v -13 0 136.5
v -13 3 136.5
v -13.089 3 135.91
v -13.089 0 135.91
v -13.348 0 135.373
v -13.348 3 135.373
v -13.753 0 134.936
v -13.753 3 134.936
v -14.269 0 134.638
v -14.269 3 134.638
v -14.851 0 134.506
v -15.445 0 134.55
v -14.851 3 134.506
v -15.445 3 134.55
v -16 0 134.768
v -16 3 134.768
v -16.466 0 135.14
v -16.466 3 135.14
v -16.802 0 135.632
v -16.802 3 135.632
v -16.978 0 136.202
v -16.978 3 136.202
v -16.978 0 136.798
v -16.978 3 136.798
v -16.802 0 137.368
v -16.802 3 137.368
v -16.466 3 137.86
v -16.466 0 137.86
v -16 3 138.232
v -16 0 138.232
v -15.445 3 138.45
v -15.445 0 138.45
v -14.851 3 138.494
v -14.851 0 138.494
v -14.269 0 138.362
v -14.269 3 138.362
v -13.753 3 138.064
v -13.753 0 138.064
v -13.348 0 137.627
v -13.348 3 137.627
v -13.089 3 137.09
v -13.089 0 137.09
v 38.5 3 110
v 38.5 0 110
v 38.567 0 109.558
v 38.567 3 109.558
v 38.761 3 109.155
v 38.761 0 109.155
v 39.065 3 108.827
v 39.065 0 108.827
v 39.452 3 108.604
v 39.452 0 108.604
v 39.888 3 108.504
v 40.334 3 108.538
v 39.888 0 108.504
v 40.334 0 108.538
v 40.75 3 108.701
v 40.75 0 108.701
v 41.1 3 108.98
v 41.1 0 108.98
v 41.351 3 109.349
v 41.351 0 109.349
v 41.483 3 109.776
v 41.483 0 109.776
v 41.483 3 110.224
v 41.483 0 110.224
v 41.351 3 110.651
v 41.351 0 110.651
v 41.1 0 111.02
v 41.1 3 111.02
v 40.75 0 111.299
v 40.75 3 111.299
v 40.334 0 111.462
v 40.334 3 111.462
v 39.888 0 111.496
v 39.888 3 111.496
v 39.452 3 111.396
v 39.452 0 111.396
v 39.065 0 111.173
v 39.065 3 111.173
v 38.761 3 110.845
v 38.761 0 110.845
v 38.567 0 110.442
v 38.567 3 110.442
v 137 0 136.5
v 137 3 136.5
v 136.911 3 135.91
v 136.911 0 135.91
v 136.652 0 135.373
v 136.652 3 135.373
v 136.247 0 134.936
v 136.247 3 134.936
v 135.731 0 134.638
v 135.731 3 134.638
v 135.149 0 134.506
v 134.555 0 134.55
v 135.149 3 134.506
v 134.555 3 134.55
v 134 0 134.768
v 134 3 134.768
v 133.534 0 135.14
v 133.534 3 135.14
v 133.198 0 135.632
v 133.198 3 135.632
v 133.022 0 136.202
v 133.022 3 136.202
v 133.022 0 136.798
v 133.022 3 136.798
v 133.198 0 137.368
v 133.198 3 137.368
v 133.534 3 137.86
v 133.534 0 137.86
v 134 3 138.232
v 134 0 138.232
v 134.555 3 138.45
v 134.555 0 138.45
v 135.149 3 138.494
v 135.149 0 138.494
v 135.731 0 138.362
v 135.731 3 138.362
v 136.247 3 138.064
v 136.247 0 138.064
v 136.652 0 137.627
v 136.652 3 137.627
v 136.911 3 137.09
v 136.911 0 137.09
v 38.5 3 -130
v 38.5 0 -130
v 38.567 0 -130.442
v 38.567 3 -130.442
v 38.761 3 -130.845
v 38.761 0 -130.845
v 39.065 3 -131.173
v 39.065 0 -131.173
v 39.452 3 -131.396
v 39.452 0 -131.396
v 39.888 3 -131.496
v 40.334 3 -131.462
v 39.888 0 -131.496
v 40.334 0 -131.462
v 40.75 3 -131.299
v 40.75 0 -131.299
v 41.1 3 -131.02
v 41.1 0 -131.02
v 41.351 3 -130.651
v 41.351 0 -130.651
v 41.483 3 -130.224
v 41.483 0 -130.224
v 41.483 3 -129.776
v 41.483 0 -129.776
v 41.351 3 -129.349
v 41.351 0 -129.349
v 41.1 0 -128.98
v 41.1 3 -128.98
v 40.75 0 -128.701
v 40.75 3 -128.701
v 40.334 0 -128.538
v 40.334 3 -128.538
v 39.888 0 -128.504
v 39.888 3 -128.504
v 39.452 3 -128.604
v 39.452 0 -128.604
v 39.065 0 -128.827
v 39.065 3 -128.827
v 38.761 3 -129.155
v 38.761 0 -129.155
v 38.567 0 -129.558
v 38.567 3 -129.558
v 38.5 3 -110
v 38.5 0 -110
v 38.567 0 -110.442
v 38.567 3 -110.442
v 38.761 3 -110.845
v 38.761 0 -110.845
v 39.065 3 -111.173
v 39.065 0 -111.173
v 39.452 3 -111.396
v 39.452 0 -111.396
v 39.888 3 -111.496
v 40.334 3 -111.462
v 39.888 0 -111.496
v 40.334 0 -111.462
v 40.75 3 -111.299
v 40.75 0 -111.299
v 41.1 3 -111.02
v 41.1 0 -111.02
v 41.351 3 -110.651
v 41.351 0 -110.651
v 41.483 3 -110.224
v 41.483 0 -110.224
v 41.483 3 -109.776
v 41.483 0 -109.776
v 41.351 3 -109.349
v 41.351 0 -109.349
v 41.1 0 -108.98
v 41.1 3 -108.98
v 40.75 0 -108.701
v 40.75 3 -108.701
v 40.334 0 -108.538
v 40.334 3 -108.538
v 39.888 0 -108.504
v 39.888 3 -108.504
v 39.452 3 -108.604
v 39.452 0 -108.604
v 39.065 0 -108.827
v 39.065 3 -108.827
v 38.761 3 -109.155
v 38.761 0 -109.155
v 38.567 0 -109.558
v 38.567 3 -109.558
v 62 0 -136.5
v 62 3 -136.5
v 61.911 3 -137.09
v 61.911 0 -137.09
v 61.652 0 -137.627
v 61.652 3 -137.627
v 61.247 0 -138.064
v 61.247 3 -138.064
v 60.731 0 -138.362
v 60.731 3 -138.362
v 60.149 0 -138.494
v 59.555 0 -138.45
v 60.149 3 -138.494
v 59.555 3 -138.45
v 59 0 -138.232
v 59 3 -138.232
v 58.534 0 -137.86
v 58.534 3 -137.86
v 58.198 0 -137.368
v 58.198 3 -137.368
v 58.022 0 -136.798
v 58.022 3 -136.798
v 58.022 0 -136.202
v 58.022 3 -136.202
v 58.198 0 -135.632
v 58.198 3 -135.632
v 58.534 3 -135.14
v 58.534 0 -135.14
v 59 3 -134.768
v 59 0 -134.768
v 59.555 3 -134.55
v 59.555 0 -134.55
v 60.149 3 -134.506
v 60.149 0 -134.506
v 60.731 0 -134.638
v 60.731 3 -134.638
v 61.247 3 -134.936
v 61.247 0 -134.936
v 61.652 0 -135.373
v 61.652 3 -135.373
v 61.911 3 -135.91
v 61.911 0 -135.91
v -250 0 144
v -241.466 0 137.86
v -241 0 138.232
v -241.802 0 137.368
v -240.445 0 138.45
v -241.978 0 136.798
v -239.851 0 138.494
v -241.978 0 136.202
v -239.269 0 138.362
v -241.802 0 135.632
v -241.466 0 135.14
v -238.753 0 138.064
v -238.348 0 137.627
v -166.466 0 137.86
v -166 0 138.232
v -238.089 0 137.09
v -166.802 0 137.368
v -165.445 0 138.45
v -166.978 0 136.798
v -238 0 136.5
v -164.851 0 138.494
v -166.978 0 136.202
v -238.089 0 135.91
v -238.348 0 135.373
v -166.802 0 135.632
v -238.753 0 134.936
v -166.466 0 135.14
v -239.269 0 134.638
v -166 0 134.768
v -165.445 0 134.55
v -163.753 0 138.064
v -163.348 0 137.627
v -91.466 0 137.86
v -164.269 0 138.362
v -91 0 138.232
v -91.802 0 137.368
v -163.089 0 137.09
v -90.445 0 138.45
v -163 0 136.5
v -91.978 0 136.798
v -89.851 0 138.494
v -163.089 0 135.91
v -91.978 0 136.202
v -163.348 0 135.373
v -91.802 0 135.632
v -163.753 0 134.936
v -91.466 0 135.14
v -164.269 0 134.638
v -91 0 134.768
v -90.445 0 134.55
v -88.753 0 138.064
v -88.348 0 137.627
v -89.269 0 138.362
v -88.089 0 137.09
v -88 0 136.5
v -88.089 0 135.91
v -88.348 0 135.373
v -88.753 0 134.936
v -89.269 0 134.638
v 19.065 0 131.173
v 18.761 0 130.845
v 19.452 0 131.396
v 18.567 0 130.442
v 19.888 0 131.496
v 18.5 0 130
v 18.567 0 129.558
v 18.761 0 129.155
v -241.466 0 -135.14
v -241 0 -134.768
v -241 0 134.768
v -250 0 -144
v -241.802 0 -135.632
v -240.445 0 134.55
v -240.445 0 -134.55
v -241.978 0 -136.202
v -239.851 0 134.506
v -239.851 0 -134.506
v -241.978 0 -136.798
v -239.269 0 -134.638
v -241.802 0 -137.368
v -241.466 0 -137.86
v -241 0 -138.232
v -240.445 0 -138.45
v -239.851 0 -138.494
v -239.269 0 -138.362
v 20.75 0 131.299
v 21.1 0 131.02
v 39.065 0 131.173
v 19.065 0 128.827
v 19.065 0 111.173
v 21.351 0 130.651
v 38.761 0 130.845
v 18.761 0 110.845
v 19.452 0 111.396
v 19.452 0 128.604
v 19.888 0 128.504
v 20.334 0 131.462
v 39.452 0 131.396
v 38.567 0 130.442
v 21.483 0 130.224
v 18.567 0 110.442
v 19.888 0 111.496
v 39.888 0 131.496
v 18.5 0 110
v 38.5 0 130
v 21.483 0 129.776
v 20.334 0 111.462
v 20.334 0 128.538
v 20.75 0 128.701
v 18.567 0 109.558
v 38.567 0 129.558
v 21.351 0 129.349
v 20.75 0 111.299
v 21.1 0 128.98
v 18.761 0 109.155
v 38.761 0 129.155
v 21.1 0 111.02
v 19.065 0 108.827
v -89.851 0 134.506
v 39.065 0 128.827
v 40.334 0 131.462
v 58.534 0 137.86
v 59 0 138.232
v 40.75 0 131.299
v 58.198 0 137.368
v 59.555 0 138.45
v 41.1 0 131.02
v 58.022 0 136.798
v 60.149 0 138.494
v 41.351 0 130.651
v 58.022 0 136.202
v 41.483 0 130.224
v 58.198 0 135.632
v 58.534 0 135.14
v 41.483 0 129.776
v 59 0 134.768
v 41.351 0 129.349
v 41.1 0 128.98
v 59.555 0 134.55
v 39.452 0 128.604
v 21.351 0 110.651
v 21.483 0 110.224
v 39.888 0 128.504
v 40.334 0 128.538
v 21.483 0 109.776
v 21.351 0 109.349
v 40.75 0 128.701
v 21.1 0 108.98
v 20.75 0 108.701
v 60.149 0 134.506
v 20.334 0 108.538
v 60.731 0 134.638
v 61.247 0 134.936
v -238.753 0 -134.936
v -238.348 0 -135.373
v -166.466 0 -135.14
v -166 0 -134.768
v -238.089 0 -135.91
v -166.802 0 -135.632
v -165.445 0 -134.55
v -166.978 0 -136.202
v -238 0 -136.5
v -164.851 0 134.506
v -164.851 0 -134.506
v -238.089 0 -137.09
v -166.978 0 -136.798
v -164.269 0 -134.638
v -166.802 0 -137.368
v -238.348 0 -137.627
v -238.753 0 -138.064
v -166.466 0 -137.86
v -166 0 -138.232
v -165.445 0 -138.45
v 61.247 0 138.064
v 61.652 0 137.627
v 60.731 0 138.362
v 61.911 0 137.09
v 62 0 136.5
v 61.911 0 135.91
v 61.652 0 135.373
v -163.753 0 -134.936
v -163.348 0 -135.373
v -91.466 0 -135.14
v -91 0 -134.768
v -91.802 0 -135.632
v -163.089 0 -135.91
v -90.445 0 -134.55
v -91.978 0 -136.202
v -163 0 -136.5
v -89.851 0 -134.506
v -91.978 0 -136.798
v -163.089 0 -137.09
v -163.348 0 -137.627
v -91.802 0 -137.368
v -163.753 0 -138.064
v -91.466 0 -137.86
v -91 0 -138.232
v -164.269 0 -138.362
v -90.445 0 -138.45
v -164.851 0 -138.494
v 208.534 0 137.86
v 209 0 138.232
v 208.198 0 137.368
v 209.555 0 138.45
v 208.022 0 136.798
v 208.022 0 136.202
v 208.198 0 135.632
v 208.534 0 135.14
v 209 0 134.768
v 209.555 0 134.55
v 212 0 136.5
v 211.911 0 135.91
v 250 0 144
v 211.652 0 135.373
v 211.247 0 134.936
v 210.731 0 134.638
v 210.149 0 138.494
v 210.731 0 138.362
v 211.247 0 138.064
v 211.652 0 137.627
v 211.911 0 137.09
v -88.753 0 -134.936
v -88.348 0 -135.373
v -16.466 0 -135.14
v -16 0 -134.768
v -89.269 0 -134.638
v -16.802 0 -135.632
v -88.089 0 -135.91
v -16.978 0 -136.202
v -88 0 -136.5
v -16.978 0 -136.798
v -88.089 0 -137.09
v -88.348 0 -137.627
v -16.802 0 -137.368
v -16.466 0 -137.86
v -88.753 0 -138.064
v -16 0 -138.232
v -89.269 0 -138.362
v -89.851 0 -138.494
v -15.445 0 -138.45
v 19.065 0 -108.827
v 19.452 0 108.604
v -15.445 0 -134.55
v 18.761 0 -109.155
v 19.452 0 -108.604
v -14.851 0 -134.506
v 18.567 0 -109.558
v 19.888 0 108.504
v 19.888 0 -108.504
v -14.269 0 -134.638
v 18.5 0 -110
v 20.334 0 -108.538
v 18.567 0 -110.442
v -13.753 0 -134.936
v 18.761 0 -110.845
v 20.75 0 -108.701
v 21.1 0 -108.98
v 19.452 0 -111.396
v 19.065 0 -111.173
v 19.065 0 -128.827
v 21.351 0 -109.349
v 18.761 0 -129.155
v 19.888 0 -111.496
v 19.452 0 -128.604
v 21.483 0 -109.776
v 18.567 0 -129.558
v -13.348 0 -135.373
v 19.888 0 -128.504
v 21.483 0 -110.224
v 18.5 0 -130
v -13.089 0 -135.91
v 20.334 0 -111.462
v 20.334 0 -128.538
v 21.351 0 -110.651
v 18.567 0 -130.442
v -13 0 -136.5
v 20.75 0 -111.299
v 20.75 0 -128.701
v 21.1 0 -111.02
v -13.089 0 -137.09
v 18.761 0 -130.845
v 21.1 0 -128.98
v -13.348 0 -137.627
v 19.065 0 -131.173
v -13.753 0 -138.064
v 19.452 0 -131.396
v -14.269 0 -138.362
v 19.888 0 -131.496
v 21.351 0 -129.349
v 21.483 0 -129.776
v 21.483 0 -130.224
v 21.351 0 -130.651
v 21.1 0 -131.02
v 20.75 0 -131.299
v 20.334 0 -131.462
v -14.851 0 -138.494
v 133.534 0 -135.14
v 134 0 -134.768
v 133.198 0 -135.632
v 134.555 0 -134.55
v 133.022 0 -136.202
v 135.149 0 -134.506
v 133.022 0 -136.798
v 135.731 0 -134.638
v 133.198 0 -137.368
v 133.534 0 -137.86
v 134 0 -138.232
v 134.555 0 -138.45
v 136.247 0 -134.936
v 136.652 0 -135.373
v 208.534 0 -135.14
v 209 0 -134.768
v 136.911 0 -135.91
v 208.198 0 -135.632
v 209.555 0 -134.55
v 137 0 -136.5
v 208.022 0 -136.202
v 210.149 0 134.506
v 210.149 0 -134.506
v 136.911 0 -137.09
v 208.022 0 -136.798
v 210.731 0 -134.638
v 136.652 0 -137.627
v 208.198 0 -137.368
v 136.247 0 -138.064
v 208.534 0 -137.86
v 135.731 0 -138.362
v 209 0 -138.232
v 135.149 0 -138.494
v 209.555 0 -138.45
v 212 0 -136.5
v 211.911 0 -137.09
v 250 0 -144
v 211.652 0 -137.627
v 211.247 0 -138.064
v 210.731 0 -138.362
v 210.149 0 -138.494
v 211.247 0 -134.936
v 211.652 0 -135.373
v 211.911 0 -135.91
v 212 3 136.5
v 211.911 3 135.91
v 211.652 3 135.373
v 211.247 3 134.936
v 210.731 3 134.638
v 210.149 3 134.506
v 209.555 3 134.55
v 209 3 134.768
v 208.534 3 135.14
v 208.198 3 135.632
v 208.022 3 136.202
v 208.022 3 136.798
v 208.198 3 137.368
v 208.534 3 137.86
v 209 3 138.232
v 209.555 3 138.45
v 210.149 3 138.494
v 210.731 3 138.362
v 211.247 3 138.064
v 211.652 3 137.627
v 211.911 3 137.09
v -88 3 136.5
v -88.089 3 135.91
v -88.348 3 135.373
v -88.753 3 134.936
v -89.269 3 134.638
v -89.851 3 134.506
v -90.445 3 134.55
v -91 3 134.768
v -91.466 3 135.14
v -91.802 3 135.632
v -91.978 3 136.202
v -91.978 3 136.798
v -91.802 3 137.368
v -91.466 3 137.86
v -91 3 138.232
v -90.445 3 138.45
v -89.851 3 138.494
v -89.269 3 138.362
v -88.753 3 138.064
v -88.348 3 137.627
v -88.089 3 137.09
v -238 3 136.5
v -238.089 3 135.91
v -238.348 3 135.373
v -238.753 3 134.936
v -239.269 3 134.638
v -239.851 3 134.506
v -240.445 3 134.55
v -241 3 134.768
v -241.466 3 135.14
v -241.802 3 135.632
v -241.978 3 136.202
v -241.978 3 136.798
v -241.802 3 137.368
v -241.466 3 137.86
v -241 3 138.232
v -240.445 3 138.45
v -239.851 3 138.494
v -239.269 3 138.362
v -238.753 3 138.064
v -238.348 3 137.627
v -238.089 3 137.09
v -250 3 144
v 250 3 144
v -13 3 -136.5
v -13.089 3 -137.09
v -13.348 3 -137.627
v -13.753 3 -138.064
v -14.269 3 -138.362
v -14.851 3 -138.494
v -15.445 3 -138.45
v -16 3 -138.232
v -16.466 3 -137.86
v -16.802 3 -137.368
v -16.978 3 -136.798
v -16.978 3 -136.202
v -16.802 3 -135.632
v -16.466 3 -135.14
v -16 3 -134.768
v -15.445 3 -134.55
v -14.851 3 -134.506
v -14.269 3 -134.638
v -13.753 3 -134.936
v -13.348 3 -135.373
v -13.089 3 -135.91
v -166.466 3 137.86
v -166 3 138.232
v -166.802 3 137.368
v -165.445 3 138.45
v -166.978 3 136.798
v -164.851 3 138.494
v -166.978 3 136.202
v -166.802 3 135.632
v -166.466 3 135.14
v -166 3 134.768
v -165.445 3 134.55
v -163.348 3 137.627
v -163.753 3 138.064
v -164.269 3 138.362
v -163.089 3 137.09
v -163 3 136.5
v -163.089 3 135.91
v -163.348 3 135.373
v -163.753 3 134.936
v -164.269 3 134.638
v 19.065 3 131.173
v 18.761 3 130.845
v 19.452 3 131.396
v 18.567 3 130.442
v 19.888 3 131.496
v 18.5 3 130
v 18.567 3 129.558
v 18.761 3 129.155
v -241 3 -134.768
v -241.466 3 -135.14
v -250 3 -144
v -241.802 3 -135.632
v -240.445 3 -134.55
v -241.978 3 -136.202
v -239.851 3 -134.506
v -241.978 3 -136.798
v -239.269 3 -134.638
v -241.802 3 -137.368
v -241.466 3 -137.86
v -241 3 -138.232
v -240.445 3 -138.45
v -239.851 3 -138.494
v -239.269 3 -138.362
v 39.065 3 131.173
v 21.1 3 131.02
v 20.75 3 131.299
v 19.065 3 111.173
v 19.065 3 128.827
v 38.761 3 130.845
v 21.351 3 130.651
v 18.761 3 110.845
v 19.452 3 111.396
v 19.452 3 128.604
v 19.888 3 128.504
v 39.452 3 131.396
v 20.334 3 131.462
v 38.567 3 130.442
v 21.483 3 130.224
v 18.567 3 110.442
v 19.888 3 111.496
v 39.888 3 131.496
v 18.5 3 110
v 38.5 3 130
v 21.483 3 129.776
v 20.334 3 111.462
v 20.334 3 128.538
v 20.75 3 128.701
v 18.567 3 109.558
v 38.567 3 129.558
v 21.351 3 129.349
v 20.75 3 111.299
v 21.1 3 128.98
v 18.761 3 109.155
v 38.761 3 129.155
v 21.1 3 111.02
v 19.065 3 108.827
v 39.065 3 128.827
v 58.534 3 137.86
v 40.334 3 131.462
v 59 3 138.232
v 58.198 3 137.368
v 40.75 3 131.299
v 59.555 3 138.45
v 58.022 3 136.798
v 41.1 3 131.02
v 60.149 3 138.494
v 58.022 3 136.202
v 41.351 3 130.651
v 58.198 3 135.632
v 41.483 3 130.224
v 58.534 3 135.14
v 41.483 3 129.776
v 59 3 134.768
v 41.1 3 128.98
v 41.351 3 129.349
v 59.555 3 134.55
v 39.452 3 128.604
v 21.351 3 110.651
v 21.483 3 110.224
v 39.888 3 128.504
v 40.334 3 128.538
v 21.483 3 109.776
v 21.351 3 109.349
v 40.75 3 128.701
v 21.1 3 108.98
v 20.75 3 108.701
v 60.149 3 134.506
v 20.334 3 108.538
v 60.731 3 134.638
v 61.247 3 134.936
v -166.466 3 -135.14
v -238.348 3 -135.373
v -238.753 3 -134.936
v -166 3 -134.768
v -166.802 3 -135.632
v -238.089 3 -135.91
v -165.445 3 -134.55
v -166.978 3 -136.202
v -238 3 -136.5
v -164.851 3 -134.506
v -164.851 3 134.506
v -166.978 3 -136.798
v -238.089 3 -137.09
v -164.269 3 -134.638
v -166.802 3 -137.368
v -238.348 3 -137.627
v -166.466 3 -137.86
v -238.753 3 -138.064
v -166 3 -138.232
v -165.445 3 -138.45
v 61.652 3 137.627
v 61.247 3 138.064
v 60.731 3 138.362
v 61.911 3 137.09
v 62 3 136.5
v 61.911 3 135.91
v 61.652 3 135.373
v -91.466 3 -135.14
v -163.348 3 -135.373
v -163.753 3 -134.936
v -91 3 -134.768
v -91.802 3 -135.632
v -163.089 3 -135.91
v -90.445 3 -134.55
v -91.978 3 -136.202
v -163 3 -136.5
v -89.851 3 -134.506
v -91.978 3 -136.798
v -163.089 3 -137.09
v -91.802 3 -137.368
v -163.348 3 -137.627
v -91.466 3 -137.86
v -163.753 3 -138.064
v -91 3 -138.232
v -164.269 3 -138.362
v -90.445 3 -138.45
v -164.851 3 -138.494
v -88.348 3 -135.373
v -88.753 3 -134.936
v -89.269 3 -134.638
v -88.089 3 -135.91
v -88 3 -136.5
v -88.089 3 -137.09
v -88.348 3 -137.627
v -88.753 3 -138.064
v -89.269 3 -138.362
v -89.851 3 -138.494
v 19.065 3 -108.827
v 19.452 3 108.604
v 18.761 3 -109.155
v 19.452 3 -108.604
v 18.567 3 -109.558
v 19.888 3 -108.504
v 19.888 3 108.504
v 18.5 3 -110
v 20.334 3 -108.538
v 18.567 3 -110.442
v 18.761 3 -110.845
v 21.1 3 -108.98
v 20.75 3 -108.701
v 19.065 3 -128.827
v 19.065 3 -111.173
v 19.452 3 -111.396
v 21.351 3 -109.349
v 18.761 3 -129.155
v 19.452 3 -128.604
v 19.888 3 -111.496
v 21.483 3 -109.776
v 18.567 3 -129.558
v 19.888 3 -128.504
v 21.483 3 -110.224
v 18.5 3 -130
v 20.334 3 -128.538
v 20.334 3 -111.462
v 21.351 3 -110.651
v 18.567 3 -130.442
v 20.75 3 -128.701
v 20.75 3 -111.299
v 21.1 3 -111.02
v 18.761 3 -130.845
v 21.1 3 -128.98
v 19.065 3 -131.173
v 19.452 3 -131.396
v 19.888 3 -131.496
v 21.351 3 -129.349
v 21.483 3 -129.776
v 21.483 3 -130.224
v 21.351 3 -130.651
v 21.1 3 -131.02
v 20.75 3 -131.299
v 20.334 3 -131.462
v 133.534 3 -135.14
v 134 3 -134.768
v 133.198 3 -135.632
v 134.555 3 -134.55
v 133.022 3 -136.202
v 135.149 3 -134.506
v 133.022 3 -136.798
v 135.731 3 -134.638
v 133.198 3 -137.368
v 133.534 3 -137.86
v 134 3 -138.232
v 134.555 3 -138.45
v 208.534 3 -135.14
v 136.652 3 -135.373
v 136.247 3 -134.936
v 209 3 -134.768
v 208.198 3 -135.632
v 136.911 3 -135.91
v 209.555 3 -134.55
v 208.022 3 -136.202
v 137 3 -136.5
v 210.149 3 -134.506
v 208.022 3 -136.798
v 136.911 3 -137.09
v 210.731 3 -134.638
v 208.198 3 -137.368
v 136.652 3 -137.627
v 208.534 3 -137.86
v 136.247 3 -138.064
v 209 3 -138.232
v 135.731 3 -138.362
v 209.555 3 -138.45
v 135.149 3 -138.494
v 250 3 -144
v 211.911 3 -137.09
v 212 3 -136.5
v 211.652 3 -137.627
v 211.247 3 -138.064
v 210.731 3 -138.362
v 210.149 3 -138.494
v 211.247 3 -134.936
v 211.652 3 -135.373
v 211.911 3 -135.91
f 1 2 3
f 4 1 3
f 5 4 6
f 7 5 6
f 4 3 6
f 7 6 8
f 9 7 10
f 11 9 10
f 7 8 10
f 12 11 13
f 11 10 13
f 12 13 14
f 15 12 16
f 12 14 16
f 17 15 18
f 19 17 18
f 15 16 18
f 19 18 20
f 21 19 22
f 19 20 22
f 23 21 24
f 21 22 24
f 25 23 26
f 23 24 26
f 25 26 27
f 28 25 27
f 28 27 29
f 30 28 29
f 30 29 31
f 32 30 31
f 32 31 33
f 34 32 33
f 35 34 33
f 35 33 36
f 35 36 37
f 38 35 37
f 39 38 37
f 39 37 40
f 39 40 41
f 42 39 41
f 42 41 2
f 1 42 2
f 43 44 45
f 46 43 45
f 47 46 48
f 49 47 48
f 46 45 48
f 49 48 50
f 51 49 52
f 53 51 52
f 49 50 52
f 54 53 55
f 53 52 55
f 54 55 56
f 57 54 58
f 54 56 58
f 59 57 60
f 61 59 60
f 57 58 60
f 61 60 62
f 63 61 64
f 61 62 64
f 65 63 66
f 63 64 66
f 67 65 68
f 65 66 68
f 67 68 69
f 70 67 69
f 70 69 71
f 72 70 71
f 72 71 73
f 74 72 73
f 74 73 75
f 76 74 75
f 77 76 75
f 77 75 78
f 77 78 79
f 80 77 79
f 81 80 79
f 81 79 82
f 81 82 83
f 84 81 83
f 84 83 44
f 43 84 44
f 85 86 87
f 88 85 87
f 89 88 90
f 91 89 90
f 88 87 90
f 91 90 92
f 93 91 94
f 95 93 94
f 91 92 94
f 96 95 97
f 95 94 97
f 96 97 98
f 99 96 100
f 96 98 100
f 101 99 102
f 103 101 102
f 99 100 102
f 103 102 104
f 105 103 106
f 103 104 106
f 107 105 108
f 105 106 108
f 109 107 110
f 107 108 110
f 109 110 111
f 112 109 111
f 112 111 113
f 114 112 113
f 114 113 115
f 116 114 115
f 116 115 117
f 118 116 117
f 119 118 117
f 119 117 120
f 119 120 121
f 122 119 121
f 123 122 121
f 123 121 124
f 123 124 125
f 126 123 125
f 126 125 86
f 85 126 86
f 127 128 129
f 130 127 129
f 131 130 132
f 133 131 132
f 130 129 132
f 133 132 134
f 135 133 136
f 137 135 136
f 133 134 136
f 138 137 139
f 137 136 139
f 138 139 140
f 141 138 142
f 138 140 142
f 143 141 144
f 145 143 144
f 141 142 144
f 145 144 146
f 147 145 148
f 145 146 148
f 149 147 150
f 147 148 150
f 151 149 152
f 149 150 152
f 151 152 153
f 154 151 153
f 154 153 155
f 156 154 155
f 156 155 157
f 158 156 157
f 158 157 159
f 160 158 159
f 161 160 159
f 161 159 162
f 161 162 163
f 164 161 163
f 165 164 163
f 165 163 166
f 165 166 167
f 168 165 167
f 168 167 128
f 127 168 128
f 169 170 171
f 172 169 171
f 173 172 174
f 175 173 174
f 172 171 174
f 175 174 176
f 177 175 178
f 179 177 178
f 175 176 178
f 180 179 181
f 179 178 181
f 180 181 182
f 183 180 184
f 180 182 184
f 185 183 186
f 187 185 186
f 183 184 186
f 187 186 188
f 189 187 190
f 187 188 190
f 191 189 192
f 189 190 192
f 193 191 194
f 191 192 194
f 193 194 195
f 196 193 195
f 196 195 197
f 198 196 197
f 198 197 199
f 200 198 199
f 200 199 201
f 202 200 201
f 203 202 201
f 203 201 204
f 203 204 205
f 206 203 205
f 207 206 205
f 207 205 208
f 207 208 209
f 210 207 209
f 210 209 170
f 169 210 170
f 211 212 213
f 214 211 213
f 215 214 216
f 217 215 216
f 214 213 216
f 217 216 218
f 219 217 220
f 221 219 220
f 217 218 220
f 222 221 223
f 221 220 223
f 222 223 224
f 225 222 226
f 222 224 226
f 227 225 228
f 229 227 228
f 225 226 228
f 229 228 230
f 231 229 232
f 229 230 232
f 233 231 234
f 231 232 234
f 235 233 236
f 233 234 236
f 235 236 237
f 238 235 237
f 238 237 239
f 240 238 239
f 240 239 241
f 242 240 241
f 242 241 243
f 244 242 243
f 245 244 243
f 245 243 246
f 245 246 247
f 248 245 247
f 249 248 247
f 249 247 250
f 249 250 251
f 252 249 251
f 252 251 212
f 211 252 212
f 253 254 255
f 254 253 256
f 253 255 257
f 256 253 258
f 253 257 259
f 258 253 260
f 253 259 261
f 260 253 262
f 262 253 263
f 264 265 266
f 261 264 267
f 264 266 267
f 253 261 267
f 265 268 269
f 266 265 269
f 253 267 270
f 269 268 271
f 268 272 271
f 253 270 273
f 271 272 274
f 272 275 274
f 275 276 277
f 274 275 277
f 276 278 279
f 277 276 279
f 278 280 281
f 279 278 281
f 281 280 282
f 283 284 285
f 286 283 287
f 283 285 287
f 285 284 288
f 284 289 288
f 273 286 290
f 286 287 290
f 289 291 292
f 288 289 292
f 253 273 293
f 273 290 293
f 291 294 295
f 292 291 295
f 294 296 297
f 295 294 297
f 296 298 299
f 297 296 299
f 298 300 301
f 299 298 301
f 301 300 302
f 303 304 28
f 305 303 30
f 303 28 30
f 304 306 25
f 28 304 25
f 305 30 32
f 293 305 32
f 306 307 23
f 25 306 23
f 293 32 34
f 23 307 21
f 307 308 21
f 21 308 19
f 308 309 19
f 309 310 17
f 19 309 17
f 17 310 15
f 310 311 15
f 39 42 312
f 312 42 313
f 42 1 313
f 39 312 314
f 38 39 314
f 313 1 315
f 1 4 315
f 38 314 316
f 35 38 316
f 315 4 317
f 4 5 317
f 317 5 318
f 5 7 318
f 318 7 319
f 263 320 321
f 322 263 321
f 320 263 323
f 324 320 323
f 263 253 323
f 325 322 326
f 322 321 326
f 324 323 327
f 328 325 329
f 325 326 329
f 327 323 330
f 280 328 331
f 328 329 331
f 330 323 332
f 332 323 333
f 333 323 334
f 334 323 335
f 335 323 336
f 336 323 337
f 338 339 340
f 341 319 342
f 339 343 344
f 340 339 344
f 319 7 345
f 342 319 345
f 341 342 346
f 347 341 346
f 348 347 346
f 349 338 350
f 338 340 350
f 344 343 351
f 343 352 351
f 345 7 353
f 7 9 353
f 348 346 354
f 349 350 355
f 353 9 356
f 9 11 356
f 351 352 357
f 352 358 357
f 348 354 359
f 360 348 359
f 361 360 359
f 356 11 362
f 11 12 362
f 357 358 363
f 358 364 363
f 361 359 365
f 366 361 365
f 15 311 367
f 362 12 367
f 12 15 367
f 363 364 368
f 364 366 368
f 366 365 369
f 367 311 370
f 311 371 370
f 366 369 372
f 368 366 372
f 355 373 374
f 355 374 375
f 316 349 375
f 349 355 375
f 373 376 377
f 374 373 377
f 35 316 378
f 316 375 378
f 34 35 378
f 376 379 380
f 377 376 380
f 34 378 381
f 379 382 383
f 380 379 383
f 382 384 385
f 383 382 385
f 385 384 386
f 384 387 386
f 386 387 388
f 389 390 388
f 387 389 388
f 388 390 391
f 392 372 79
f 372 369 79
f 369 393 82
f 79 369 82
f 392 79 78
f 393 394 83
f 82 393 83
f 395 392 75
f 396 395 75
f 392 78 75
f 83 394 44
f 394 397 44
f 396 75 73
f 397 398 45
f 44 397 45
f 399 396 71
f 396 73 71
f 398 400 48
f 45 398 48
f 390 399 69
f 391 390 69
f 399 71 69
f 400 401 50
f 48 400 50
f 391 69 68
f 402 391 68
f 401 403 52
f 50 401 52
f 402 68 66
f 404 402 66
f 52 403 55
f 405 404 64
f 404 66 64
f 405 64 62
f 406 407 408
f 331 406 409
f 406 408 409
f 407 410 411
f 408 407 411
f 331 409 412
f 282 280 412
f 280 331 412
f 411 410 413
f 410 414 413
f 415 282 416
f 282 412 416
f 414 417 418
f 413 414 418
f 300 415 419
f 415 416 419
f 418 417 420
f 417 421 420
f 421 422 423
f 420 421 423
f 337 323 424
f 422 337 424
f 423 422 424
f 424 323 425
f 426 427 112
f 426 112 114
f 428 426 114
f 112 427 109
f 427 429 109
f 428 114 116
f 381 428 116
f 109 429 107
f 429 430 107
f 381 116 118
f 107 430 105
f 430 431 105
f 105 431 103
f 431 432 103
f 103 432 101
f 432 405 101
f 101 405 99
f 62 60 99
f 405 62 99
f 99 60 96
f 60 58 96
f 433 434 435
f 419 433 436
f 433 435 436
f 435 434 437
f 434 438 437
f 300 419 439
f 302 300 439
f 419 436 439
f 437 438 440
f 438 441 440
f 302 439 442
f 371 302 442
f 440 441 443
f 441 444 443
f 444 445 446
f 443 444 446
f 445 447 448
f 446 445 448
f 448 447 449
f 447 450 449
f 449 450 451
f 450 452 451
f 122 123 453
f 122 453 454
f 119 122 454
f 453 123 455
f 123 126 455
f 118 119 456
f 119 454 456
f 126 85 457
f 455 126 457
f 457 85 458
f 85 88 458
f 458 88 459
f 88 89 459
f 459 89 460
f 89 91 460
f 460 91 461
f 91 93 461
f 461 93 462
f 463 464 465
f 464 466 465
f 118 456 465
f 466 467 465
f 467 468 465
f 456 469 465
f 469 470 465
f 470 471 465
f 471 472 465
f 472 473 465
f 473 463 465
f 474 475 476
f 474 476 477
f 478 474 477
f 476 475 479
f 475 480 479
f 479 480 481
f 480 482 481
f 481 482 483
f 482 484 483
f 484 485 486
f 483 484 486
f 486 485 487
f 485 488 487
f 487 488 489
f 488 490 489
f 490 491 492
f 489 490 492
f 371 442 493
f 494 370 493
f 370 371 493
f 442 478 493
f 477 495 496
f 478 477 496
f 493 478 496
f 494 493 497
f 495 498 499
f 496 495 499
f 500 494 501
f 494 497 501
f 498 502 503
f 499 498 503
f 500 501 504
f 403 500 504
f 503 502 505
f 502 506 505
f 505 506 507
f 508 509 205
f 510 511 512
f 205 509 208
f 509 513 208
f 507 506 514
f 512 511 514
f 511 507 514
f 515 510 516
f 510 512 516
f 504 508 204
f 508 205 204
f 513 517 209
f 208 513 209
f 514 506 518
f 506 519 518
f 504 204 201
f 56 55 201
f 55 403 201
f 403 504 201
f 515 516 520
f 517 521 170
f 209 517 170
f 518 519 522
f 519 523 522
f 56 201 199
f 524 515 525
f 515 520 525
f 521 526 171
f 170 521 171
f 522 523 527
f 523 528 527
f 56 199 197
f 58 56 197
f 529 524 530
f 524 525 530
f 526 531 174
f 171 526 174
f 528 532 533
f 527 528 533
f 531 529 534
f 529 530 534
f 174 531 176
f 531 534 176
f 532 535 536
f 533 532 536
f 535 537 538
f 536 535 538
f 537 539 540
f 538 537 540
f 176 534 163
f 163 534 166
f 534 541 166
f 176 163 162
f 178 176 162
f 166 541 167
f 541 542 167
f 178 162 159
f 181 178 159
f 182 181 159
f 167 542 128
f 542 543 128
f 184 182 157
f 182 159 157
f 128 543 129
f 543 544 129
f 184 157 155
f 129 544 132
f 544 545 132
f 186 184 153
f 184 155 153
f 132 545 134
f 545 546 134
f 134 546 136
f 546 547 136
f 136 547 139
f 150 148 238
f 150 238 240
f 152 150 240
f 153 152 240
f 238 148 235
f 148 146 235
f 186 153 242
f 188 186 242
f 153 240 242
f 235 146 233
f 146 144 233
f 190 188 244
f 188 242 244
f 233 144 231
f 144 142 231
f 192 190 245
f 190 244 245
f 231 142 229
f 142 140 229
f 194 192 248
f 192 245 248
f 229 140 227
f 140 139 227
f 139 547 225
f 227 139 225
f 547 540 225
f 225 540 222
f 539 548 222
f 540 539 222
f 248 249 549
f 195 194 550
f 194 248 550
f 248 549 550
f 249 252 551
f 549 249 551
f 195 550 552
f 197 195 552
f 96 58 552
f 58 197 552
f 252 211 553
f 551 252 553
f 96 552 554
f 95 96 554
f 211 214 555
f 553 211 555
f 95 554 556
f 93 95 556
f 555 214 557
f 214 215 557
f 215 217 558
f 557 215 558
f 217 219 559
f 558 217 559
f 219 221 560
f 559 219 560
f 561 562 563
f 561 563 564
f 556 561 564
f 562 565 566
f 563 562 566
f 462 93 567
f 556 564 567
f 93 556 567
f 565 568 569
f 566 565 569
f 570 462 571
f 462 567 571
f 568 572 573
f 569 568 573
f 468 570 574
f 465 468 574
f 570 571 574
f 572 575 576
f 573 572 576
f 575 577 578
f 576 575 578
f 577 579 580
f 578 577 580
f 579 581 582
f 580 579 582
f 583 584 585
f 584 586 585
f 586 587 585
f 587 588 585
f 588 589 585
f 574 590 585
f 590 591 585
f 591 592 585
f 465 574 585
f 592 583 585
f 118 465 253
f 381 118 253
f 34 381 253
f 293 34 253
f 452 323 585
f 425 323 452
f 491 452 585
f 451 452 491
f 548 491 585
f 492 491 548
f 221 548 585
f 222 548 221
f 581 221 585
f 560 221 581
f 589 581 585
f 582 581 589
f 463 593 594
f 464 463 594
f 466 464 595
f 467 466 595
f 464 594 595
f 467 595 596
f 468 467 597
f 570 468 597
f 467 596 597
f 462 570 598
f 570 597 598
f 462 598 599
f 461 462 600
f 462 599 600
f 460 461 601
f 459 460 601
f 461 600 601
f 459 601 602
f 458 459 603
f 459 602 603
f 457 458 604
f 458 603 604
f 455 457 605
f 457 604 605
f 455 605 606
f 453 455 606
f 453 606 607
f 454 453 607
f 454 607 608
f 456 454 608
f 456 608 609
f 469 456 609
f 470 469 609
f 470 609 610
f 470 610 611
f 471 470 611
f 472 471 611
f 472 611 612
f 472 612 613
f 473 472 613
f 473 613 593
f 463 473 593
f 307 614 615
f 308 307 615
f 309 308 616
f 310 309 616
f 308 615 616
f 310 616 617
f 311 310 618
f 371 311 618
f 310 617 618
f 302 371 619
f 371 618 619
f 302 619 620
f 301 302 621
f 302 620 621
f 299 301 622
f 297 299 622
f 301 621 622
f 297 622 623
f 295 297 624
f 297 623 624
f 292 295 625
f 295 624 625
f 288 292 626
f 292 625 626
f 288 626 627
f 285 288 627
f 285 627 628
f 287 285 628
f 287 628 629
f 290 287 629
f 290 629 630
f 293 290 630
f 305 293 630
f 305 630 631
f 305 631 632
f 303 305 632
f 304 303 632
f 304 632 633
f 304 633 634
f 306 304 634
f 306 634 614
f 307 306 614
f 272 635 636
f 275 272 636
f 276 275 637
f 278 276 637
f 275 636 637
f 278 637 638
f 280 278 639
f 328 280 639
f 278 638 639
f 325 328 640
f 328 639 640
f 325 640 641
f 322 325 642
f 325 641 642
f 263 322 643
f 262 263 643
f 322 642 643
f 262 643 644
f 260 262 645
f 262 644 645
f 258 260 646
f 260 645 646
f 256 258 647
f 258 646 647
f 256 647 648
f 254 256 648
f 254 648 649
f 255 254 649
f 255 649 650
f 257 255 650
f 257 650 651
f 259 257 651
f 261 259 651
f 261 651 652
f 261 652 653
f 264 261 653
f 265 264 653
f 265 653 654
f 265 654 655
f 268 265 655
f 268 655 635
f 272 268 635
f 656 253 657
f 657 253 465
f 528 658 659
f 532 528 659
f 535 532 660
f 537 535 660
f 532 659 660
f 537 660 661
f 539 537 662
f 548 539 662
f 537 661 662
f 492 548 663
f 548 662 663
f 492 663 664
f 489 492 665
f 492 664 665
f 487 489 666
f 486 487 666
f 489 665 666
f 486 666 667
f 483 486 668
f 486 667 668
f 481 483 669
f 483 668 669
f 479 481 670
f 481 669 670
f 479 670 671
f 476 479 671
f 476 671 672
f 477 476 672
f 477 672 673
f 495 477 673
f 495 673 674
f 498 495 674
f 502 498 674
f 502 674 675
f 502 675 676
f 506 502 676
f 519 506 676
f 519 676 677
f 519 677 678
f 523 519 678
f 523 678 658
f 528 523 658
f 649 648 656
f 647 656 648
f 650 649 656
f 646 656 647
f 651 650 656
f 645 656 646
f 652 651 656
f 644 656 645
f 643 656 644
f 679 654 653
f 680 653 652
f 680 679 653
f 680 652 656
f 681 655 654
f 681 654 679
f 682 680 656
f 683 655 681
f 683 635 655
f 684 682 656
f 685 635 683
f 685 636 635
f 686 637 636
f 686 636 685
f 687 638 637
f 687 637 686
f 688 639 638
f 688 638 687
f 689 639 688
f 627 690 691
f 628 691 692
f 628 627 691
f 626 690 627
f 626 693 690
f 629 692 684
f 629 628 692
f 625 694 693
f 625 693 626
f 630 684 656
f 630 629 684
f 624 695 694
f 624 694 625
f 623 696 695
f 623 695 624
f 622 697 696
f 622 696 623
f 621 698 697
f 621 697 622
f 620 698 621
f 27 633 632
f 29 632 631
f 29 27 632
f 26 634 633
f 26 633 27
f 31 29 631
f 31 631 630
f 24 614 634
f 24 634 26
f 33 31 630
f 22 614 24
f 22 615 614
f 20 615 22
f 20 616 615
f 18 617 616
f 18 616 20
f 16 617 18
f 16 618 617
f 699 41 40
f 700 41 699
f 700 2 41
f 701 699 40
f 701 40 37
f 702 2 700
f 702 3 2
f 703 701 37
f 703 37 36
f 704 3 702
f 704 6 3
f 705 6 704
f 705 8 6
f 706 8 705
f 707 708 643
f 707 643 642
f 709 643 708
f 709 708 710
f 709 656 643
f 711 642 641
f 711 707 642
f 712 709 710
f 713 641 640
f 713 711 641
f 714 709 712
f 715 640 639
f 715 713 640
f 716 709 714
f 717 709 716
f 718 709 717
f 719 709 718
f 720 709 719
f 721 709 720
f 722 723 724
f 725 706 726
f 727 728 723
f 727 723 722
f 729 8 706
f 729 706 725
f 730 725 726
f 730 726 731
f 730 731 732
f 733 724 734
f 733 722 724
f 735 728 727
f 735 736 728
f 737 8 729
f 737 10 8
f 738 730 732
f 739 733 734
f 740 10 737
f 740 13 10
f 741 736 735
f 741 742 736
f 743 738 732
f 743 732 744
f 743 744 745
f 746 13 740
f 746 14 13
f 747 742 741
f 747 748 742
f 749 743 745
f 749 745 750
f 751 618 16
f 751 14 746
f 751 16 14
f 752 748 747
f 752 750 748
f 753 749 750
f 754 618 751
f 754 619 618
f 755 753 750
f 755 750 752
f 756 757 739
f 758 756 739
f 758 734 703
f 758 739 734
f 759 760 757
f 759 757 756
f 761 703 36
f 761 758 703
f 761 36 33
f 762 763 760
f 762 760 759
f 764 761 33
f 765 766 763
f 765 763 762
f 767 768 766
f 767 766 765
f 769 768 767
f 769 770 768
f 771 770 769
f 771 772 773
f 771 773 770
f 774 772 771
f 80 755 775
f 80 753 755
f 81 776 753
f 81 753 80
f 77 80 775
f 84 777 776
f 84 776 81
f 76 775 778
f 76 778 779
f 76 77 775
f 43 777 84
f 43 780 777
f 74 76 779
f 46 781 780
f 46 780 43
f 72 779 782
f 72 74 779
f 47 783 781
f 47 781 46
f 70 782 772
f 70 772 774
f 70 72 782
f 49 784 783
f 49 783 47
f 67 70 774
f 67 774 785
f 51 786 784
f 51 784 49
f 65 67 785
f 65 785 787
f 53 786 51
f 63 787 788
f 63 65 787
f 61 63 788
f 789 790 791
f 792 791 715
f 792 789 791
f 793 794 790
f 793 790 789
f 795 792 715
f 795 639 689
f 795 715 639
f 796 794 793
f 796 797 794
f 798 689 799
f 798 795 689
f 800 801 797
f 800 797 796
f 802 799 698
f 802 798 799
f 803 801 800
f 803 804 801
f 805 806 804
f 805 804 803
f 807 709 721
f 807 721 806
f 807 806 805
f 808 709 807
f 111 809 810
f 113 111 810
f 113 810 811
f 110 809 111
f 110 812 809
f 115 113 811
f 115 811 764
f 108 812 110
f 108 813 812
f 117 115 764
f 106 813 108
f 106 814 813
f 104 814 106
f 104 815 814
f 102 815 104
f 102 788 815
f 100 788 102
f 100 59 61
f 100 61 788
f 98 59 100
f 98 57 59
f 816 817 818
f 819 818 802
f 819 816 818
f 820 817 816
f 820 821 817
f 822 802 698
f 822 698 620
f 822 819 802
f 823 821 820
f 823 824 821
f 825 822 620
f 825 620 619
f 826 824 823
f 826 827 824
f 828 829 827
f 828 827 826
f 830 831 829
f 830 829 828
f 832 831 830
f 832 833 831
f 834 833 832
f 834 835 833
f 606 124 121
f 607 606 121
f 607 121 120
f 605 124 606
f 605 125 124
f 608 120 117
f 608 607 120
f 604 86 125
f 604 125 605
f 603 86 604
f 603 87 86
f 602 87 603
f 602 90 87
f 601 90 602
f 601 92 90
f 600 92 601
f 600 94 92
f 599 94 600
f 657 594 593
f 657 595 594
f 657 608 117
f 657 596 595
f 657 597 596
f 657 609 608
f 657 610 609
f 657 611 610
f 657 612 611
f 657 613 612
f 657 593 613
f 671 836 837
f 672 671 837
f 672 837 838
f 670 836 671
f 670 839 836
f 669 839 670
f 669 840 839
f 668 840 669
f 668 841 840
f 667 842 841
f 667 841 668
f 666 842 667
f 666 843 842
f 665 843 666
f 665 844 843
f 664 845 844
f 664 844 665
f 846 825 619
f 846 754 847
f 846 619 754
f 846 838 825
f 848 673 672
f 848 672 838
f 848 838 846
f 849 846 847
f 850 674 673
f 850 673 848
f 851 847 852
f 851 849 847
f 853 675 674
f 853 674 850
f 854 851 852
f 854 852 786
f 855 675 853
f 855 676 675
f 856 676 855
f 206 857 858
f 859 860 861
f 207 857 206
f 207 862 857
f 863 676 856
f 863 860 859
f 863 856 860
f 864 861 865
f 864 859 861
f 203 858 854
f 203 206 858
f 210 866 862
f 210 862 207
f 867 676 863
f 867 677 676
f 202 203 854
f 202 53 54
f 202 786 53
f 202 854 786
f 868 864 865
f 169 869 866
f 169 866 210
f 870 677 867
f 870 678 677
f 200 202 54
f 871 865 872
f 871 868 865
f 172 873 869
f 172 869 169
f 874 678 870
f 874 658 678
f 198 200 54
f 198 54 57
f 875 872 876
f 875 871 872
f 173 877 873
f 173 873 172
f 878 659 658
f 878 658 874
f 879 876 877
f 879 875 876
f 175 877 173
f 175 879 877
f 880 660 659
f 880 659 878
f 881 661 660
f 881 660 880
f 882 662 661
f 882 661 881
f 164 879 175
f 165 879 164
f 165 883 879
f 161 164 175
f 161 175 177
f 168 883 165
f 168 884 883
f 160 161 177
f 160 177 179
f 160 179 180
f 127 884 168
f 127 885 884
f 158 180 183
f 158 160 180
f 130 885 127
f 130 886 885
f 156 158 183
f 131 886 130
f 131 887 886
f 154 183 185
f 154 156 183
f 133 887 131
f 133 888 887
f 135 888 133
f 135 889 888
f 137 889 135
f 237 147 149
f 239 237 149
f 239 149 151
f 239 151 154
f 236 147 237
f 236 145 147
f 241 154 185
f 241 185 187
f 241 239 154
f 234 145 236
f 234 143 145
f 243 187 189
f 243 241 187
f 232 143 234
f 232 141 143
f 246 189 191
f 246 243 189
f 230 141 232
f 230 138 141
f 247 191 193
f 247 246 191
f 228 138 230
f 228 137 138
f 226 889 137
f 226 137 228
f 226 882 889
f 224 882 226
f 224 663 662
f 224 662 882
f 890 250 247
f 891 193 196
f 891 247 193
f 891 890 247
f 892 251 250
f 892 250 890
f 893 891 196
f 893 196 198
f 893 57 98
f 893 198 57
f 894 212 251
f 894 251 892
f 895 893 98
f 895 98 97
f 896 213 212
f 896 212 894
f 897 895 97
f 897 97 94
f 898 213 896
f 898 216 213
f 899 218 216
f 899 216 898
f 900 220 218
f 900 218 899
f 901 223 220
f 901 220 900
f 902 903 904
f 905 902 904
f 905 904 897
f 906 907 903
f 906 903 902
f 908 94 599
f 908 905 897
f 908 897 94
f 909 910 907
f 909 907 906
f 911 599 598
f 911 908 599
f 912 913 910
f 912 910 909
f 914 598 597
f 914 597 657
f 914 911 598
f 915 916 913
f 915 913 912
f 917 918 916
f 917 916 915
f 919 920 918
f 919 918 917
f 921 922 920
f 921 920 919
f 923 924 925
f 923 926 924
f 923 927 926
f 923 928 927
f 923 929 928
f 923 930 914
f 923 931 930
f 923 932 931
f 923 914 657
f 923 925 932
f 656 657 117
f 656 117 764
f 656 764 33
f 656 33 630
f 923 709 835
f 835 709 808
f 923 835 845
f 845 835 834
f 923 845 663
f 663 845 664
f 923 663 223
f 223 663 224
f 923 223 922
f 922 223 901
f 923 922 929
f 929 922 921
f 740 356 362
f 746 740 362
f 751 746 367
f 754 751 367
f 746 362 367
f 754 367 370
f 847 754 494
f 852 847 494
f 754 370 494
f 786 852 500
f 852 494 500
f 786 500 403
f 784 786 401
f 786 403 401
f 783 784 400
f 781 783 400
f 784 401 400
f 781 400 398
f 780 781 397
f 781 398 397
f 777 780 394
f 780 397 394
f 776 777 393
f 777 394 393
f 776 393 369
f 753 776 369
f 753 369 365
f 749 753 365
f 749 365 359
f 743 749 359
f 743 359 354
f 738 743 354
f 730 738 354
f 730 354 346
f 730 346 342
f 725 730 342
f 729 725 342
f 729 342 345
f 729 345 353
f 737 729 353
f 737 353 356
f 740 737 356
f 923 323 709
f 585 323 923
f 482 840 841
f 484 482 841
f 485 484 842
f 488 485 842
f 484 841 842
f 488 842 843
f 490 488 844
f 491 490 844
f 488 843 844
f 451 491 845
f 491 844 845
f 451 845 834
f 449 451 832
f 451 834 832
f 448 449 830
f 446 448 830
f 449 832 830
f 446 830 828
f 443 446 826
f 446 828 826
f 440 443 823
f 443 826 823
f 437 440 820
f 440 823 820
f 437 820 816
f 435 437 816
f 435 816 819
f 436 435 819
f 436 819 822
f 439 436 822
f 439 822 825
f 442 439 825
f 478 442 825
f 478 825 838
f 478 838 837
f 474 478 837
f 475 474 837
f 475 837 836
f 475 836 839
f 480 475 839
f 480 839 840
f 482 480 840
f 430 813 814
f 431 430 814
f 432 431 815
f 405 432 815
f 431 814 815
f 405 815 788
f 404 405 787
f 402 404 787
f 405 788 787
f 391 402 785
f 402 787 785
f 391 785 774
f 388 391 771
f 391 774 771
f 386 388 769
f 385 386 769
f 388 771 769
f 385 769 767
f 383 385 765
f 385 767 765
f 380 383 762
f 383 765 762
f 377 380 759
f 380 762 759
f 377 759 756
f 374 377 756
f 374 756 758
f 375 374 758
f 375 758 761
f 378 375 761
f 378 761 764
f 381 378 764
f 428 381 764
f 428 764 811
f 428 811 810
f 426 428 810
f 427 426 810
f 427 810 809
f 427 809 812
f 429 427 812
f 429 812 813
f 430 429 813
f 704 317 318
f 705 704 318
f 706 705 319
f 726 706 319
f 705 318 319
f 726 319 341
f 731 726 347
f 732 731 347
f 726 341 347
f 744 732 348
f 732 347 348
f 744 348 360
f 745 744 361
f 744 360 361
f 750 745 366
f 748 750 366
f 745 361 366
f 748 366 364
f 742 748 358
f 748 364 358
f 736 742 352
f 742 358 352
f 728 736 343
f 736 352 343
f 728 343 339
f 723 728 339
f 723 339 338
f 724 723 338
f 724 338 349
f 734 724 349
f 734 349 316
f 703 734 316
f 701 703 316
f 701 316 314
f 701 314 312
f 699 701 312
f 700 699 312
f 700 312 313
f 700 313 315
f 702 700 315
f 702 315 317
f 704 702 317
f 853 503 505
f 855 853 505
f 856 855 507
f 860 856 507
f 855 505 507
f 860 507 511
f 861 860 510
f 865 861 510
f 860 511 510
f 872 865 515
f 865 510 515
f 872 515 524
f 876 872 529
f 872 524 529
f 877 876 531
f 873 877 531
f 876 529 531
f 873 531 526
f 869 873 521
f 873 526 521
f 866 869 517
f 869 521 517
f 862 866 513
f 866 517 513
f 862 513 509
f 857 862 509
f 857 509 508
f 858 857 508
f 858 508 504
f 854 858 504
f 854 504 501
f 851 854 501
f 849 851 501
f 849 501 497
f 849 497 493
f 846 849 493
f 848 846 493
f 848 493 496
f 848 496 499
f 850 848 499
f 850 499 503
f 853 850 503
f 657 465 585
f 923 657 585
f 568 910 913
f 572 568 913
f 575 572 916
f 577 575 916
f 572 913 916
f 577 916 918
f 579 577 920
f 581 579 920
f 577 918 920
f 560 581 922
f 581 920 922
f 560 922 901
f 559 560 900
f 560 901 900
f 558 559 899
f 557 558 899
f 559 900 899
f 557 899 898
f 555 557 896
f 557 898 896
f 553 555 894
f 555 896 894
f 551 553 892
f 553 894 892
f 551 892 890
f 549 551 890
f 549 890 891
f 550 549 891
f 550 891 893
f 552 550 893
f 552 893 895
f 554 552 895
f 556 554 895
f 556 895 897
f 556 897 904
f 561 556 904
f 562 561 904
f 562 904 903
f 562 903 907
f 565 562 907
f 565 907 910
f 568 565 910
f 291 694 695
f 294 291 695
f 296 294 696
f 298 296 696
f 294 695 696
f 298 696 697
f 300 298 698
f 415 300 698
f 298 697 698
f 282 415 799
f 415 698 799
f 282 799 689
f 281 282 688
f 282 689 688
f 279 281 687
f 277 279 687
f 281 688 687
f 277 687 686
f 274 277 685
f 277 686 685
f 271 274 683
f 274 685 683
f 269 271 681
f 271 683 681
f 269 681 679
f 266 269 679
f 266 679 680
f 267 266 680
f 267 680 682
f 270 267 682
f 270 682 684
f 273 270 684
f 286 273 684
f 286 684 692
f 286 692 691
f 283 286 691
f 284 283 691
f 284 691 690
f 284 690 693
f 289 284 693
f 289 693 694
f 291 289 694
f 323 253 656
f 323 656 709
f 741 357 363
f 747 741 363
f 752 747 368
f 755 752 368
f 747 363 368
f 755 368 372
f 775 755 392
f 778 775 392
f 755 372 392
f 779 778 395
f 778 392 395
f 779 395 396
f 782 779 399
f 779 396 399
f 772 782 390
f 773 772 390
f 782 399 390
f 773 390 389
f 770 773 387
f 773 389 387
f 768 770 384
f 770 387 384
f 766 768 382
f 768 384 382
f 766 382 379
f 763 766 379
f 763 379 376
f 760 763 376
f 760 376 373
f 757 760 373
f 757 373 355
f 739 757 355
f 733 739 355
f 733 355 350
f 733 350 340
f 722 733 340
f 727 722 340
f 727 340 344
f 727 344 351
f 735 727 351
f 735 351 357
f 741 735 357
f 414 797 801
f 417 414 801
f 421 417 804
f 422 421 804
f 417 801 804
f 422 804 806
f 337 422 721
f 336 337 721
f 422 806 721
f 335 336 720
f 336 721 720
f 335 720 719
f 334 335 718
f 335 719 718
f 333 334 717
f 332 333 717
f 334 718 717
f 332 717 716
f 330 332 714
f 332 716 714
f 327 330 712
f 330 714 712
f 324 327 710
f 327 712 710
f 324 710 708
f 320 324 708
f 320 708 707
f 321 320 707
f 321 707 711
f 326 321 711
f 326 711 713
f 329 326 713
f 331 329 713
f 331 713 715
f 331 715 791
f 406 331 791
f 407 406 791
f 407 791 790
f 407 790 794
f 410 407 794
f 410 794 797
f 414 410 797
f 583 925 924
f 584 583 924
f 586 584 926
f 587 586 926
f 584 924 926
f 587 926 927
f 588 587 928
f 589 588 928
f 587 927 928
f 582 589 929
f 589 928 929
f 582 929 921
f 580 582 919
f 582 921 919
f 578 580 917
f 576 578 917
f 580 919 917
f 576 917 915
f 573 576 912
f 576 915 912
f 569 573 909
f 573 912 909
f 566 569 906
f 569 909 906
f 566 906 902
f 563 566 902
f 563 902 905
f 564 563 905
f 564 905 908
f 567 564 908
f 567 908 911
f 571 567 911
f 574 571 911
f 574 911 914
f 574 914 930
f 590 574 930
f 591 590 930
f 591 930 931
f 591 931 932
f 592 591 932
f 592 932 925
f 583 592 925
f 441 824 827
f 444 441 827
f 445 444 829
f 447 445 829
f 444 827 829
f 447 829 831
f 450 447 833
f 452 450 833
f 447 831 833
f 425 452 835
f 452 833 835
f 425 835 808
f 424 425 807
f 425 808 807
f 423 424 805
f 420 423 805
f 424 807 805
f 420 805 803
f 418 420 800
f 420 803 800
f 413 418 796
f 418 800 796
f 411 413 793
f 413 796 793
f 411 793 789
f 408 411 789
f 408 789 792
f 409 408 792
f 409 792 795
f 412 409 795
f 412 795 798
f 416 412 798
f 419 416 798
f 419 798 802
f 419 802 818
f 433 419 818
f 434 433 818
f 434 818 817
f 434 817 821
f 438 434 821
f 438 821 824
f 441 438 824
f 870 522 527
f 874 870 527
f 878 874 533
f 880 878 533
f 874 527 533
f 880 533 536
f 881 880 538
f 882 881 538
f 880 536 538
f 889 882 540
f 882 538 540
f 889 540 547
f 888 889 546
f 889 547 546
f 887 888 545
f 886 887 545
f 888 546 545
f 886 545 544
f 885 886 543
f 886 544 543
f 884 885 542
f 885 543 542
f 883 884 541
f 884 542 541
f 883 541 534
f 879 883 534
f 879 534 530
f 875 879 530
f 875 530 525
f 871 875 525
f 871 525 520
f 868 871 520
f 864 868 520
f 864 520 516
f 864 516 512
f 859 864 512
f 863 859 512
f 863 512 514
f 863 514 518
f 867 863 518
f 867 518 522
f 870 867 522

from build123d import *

# Parameters (mm, degrees)
SKETCH1_W           = 500
SKETCH1_H           = 288
BOSS_EXTRUDE1_DEPTH = 3
SKETCH2_R           = 2
CUT_EXTRUDE1_DEPTH  = 10
SKETCH3_R           = 1.5
CUT_EXTRUDE2_DEPTH  = 10


with BuildPart() as part:
    # Sketch1 → Boss-Extrude1 (new body)
    with BuildSketch(Plane(origin=(0, 0, 0), x_dir=(1, 0, 0), z_dir=(0, 1, 0))):
        Rectangle(SKETCH1_W, SKETCH1_H)
    extrude(amount=BOSS_EXTRUDE1_DEPTH)

    # Sketch2 → Cut-Extrude1 (cut)
    with BuildSketch(Plane(origin=(0, 3, 0), x_dir=(1, 0, 0), z_dir=(0, 1, 0))):
        with Locations((-240, 136.5)):
            Circle(SKETCH2_R)
        with Locations((-165, 136.5)):
            Circle(SKETCH2_R)
        with Locations((-90, 136.5)):
            Circle(SKETCH2_R)
        with Locations((-15, 136.5)):
            Circle(SKETCH2_R)
        with Locations((60, 136.5)):
            Circle(SKETCH2_R)
        with Locations((135, 136.5)):
            Circle(SKETCH2_R)
        with Locations((135, -136.5)):
            Circle(SKETCH2_R)
        with Locations((60, -136.5)):
            Circle(SKETCH2_R)
        with Locations((-15, -136.5)):
            Circle(SKETCH2_R)
        with Locations((-90, -136.5)):
            Circle(SKETCH2_R)
        with Locations((-165, -136.5)):
            Circle(SKETCH2_R)
        with Locations((-240, -136.5)):
            Circle(SKETCH2_R)
        with Locations((210, 136.5)):
            Circle(SKETCH2_R)
        with Locations((210, -136.5)):
            Circle(SKETCH2_R)
    extrude(amount=-CUT_EXTRUDE1_DEPTH, mode=Mode.SUBTRACT)

    # Sketch3 → Cut-Extrude2 (cut)
    with BuildSketch(Plane(origin=(0, 0, 0), x_dir=(-1, 0, 0), z_dir=(0, -1, 0))):
        with Locations((-20, -110)):
            Circle(SKETCH3_R)
        with Locations((-40, -110)):
            Circle(SKETCH3_R)
        with Locations((-20, 110)):
            Circle(SKETCH3_R)
        with Locations((-40, 110)):
            Circle(SKETCH3_R)
        with Locations((-20, 130)):
            Circle(SKETCH3_R)
        with Locations((-40, 130)):
            Circle(SKETCH3_R)
        with Locations((-20, -130)):
            Circle(SKETCH3_R)
        with Locations((-40, -130)):
            Circle(SKETCH3_R)
    extrude(amount=-CUT_EXTRUDE2_DEPTH, mode=Mode.SUBTRACT)


solid = part.part
